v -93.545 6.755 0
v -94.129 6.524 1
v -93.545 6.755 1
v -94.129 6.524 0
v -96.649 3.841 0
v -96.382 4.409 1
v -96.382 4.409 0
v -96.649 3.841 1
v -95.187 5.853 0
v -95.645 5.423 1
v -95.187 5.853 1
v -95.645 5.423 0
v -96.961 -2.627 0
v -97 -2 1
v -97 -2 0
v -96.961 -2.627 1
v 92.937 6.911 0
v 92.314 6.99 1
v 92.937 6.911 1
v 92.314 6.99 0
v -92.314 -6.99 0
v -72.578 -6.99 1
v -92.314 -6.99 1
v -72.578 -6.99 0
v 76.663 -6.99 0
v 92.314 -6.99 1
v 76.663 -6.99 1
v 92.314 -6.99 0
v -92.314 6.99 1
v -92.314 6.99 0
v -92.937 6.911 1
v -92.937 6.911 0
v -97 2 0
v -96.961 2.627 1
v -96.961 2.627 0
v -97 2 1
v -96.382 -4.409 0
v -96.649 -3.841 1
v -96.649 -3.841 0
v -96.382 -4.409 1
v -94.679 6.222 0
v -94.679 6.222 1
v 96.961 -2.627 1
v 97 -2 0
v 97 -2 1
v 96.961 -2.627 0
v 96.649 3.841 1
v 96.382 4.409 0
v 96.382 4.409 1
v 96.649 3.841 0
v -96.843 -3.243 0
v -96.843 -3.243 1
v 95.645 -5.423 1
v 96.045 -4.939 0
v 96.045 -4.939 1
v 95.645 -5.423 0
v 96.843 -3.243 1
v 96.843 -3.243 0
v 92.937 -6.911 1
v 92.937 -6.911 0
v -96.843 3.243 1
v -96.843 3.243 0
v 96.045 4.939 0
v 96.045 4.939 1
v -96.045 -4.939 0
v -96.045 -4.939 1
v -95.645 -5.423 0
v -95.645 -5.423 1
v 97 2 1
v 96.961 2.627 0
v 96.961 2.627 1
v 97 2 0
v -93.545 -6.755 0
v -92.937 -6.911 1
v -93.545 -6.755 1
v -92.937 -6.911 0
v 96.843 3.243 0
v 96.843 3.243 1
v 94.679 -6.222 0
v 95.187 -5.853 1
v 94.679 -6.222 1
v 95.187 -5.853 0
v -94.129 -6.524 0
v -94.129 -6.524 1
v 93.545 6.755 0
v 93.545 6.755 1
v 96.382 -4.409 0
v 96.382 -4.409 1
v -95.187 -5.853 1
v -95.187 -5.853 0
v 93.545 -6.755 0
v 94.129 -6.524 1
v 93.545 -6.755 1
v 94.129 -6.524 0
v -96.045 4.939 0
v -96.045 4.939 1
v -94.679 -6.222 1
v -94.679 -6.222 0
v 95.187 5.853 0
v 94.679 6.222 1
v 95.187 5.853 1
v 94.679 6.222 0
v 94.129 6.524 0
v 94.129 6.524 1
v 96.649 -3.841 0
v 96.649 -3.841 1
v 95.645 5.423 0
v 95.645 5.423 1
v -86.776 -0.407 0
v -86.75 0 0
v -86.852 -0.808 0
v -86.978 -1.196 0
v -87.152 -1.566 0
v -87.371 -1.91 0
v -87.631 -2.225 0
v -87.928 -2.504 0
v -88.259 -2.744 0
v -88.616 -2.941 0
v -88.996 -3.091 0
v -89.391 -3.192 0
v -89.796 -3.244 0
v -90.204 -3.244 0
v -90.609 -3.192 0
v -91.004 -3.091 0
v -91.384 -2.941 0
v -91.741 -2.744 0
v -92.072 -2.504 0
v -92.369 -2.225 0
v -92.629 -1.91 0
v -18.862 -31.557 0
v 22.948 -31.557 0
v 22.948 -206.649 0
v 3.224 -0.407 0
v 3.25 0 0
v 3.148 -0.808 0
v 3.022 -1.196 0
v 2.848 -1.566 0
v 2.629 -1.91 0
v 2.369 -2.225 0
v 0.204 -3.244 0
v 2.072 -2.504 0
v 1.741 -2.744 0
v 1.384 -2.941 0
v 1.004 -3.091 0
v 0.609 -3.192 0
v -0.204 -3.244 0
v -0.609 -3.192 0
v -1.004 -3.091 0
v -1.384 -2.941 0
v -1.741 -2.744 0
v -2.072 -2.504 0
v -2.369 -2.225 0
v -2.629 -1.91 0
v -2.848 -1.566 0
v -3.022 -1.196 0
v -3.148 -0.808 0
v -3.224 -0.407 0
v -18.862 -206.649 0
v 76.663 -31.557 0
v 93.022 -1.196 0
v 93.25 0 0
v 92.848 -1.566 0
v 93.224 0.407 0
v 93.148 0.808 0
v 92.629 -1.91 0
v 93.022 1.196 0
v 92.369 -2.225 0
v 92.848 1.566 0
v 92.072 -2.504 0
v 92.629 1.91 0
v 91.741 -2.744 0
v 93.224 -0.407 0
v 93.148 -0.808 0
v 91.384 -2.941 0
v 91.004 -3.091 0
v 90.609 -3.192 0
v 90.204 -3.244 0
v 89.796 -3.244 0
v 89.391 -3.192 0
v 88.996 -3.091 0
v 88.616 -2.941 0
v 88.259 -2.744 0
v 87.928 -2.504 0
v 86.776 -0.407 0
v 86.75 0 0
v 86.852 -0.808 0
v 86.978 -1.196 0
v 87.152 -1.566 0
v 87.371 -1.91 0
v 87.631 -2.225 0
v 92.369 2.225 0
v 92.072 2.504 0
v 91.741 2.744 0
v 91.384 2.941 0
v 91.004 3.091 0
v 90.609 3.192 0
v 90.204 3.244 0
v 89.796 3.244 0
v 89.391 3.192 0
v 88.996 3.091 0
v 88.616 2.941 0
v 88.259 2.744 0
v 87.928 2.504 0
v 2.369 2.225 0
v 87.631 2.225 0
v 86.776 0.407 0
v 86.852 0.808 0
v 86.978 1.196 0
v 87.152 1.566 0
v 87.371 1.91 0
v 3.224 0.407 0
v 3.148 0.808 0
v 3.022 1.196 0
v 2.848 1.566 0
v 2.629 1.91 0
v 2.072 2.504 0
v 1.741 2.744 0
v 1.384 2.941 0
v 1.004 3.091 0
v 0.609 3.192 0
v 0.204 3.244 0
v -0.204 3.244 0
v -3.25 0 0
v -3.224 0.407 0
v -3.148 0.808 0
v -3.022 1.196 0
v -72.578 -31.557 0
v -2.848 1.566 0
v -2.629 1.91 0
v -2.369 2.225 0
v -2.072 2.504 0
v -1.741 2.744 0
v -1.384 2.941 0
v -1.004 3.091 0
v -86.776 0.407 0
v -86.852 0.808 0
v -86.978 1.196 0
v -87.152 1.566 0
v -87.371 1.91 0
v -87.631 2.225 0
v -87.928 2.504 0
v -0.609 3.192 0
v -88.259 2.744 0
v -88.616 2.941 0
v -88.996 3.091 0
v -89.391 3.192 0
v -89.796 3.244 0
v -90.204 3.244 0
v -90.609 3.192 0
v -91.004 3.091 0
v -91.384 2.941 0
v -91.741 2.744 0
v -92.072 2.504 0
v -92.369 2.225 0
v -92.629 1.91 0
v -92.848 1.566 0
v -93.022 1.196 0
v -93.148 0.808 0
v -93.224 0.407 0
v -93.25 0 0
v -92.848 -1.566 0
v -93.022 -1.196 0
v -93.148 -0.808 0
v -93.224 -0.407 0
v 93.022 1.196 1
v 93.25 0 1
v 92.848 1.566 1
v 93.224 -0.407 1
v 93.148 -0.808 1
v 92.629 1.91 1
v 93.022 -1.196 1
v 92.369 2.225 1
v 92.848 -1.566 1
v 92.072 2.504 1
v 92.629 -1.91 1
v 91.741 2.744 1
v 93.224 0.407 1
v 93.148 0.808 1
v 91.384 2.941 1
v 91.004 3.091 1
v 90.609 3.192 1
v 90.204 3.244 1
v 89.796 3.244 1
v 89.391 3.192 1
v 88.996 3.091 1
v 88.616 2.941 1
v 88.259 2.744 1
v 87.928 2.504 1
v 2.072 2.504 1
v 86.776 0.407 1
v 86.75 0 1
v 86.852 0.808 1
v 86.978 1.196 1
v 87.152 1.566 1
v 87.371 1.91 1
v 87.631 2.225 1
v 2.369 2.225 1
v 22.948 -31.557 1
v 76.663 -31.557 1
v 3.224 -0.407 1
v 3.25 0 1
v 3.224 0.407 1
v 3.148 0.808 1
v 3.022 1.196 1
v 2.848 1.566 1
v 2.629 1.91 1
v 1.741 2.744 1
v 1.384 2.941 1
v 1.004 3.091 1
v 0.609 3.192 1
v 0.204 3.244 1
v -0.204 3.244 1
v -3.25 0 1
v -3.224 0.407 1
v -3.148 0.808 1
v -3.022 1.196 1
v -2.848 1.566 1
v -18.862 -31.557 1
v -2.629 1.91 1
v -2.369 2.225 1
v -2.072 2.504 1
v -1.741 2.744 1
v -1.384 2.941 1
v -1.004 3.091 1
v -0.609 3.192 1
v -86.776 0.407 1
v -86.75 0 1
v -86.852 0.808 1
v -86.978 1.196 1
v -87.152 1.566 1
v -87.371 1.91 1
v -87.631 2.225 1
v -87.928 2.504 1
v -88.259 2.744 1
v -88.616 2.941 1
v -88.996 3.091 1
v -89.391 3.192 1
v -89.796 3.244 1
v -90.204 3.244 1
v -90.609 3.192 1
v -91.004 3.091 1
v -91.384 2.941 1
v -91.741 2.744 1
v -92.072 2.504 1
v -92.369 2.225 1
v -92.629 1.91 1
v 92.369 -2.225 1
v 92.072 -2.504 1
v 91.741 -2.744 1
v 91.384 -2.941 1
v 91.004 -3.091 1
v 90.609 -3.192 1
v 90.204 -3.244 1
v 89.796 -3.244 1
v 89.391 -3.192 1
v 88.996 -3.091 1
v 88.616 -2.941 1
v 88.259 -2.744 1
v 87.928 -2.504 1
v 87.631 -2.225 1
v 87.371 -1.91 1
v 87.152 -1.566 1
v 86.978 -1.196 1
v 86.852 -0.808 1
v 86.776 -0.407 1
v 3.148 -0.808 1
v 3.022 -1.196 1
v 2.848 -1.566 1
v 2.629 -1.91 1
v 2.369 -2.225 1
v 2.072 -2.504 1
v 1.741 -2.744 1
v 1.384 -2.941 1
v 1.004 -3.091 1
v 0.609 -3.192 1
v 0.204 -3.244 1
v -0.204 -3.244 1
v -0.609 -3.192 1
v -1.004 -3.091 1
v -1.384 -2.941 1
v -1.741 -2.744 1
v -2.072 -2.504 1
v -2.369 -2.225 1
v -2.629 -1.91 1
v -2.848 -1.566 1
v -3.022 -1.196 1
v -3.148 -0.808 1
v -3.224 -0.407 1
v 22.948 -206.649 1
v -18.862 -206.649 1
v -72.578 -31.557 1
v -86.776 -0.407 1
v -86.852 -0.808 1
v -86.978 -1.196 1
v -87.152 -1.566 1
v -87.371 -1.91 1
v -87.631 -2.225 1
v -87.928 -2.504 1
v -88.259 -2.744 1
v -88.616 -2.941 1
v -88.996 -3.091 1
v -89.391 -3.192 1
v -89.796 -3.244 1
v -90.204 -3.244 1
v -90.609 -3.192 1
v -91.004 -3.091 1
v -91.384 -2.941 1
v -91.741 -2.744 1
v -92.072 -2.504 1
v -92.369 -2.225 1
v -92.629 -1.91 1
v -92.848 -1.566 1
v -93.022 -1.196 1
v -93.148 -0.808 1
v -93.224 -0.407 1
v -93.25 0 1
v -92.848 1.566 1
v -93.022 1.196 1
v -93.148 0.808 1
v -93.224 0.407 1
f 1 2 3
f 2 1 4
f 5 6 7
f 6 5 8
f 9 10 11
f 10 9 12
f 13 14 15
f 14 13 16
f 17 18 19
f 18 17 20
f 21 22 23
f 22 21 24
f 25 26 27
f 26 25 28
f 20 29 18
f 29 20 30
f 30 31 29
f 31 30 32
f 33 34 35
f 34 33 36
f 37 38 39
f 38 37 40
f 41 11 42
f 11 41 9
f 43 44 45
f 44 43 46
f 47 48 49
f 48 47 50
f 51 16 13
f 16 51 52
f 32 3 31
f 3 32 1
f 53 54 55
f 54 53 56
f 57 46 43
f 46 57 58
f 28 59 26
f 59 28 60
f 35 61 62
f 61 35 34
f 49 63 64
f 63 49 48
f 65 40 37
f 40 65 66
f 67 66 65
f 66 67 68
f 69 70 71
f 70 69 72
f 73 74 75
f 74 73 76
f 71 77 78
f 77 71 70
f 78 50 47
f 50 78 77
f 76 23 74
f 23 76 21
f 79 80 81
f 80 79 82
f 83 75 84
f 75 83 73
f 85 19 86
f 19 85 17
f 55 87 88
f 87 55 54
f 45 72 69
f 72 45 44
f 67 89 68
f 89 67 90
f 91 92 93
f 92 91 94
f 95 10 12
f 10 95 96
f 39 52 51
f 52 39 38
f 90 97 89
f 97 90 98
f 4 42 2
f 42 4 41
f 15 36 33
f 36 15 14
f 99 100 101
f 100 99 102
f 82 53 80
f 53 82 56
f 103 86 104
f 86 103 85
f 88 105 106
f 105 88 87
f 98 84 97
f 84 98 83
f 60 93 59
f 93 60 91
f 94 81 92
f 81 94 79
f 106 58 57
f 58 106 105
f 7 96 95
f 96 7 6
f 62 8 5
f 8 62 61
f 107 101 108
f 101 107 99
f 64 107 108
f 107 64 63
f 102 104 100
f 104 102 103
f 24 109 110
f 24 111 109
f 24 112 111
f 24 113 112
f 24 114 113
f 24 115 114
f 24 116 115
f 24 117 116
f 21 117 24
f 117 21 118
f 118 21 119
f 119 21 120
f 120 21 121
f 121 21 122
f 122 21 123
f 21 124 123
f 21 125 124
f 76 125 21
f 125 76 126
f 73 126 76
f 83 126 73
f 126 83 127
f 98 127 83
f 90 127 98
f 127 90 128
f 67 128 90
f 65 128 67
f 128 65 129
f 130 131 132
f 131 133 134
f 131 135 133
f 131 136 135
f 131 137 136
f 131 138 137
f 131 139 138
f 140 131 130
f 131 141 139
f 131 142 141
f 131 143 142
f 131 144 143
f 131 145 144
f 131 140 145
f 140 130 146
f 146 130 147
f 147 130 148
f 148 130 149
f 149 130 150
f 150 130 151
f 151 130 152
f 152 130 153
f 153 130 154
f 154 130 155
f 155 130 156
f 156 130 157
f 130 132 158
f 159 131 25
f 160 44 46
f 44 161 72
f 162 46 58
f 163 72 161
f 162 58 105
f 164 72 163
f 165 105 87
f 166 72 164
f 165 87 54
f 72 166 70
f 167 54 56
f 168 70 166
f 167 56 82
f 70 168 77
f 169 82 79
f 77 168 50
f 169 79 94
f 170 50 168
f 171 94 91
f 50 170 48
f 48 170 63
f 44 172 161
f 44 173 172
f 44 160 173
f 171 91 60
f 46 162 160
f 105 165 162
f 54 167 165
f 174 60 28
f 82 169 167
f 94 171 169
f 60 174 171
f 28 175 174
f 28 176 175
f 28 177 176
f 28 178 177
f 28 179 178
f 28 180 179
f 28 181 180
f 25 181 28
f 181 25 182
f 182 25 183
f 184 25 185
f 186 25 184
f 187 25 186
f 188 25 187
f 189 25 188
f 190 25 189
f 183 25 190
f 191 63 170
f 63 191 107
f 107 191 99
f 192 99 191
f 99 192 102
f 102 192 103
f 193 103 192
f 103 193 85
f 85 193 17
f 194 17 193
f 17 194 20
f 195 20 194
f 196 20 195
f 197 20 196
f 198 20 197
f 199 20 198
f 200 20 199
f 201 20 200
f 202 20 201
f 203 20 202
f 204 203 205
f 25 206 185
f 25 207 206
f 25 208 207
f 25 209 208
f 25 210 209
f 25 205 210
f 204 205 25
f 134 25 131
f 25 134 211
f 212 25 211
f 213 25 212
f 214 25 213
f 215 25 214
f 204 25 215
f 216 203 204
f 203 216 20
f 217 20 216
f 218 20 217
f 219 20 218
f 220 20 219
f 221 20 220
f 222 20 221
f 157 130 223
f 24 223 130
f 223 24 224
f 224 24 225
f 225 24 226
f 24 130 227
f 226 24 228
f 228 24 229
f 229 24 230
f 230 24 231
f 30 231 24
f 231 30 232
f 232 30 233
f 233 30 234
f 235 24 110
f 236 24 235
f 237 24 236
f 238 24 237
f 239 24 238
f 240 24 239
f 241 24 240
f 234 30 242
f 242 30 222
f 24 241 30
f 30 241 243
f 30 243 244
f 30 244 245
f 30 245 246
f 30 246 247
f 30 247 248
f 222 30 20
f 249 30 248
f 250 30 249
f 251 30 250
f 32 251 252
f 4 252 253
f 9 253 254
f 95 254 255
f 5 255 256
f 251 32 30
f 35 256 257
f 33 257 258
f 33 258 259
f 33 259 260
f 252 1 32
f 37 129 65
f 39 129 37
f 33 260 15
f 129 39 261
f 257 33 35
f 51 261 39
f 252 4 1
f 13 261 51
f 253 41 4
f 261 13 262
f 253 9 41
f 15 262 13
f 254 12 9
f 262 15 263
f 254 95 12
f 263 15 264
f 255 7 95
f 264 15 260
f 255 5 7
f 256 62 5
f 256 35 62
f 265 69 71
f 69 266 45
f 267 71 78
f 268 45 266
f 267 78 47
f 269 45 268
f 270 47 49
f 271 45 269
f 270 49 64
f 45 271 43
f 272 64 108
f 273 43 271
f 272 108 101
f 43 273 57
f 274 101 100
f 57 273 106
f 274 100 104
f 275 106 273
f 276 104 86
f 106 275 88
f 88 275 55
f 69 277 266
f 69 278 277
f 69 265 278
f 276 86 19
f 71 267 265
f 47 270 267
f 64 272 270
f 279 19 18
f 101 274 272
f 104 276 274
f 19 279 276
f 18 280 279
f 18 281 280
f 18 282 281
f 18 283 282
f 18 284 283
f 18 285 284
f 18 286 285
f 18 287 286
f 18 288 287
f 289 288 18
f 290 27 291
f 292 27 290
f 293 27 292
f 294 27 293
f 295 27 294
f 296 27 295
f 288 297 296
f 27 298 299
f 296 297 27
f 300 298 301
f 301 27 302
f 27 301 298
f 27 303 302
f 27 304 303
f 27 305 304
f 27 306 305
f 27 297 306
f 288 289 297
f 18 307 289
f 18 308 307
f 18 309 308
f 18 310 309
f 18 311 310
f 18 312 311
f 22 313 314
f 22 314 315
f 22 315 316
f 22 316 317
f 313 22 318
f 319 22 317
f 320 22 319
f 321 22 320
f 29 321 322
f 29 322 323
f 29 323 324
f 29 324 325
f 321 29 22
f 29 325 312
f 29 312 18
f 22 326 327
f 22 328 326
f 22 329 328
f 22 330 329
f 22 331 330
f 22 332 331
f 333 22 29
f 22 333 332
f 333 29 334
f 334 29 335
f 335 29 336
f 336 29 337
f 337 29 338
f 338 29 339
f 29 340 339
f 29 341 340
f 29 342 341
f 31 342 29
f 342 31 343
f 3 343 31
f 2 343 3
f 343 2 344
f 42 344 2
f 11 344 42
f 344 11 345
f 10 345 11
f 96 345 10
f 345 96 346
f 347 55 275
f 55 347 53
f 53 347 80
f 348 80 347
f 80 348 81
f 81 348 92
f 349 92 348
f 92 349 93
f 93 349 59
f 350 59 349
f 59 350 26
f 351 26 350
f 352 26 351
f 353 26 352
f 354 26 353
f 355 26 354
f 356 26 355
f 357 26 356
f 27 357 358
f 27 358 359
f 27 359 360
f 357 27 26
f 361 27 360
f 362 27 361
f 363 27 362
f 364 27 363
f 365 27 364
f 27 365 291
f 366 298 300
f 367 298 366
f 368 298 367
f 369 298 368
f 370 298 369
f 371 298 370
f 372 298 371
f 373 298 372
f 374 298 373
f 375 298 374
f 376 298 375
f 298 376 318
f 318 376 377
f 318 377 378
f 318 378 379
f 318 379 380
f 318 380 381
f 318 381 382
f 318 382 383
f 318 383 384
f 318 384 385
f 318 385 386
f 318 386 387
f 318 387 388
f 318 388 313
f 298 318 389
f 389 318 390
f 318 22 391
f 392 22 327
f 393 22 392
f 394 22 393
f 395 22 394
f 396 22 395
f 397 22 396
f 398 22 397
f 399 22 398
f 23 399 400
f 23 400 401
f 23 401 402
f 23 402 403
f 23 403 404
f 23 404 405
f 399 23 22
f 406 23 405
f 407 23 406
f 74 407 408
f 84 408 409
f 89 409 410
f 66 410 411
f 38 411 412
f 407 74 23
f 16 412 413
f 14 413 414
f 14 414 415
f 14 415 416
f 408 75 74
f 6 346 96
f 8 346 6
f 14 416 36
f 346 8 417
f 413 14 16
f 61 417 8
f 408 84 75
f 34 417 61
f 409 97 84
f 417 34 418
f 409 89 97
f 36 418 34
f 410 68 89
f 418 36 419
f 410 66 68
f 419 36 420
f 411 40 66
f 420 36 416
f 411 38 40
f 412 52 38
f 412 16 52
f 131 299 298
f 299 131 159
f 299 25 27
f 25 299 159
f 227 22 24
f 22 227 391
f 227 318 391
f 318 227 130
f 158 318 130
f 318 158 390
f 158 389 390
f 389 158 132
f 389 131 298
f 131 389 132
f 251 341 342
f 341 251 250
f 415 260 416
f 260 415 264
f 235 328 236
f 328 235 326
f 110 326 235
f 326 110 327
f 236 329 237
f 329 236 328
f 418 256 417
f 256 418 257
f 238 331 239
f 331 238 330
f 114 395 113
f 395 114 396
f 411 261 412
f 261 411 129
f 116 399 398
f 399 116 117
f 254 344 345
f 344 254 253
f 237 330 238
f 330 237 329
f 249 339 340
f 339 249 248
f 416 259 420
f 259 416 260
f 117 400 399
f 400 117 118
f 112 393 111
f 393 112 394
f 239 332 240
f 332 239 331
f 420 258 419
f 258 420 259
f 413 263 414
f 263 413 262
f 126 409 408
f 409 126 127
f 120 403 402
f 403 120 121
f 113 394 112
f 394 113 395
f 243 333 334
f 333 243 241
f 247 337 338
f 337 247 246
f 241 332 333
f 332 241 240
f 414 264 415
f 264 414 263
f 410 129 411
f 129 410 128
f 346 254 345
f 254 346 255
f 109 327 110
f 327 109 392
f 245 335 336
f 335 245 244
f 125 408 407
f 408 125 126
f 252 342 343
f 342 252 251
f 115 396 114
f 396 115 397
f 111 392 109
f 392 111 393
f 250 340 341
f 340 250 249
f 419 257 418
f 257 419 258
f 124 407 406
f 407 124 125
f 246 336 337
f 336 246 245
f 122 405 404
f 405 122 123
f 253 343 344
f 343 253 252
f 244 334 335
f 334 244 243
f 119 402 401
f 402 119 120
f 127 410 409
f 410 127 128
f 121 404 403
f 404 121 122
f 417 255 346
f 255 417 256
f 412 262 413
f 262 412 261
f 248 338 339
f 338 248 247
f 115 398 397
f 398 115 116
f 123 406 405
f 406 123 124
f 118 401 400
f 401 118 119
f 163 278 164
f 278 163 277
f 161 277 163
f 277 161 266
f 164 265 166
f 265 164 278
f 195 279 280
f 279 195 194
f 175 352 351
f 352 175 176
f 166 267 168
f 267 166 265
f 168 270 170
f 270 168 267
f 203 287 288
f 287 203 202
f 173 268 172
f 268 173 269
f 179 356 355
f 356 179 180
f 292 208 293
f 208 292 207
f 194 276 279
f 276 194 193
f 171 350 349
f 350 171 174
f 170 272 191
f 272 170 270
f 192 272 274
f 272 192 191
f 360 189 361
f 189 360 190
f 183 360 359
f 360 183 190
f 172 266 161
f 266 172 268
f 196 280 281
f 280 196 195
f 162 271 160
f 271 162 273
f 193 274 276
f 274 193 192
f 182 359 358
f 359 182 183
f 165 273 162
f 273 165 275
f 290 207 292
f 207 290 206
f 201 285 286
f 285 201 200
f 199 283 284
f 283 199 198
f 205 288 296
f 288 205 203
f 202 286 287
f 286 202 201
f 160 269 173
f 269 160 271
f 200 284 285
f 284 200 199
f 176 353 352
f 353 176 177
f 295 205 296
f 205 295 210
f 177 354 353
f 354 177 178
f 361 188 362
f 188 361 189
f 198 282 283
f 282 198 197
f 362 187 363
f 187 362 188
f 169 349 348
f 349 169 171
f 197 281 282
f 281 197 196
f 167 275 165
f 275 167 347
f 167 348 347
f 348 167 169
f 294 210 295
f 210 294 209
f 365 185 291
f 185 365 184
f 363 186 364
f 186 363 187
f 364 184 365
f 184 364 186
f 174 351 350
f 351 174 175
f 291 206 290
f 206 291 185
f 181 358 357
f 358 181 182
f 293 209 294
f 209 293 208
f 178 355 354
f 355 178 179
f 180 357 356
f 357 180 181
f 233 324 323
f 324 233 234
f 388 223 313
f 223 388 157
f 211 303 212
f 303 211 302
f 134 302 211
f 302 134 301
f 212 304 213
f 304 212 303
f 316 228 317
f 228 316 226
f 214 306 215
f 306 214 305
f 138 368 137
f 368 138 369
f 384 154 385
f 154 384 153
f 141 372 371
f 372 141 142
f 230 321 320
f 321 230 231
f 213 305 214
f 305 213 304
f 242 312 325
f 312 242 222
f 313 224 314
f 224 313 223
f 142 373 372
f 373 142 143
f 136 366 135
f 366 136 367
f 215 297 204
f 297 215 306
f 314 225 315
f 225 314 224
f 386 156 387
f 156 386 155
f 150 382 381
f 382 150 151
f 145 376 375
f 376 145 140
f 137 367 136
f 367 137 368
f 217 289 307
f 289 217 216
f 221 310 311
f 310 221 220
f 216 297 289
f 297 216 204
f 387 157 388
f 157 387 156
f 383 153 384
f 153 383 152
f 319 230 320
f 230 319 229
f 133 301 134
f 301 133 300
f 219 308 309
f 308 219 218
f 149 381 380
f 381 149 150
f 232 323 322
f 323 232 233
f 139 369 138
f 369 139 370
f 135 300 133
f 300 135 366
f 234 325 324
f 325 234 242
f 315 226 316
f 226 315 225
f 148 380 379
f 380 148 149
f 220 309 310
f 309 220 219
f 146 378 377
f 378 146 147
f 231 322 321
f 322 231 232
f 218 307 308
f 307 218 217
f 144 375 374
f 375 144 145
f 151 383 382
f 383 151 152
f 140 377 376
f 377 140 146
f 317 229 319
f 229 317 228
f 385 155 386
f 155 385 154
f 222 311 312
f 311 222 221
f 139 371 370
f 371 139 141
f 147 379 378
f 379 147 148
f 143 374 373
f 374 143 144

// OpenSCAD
$fn = 50;


difference() {
	union() {
		translate(v = [0, 0, 0]) {
			rotate(a = [0, 0, 0]) {
				hull() {
					translate(v = [-92.0000000000, 2.0000000000, 0]) {
						rotate(a = [0, 0, 0]) {
							translate(v = [0, 0, 0]) {
								rotate(a = [0, 0, 0]) {
									cylinder(h = 1, r = 5);
								}
							}
						}
					}
					translate(v = [92.0000000000, 2.0000000000, 0]) {
						rotate(a = [0, 0, 0]) {
							translate(v = [0, 0, 0]) {
								rotate(a = [0, 0, 0]) {
									cylinder(h = 1, r = 5);
								}
							}
						}
					}
					translate(v = [-92.0000000000, -2.0000000000, 0]) {
						rotate(a = [0, 0, 0]) {
							translate(v = [0, 0, 0]) {
								rotate(a = [0, 0, 0]) {
									cylinder(h = 1, r = 5);
								}
							}
						}
					}
					translate(v = [92.0000000000, -2.0000000000, 0]) {
						rotate(a = [0, 0, 0]) {
							translate(v = [0, 0, 0]) {
								rotate(a = [0, 0, 0]) {
									cylinder(h = 1, r = 5);
								}
							}
						}
					}
				}
			}
		}
		translate(v = [0, 0, 0]) {
			rotate(a = [0, 0, 0]) {
				linear_extrude(height = 1) {
					text(font = "DejaVu Sans Mono:style=Bold", halign = "center", size = 209.0000000000, text = "T", valign = "top");
				}
			}
		}
	}
	union() {
		translate(v = [-90.0000000000, 0.0000000000, -125.0000000000]) {
			rotate(a = [0, 0, 0]) {
				cylinder(h = 250, r = 3.2500000000);
			}
		}
		translate(v = [90.0000000000, 0.0000000000, -125.0000000000]) {
			rotate(a = [0, 0, 0]) {
				cylinder(h = 250, r = 3.2500000000);
			}
		}
		translate(v = [90.0000000000, 0.0000000000, -125.0000000000]) {
			rotate(a = [0, 0, 0]) {
				cylinder(h = 250, r = 3.2500000000);
			}
		}
		translate(v = [0, 0, -125.0000000000]) {
			rotate(a = [0, 0, 0]) {
				cylinder(h = 250, r = 3.2500000000);
			}
		}
	}
}
